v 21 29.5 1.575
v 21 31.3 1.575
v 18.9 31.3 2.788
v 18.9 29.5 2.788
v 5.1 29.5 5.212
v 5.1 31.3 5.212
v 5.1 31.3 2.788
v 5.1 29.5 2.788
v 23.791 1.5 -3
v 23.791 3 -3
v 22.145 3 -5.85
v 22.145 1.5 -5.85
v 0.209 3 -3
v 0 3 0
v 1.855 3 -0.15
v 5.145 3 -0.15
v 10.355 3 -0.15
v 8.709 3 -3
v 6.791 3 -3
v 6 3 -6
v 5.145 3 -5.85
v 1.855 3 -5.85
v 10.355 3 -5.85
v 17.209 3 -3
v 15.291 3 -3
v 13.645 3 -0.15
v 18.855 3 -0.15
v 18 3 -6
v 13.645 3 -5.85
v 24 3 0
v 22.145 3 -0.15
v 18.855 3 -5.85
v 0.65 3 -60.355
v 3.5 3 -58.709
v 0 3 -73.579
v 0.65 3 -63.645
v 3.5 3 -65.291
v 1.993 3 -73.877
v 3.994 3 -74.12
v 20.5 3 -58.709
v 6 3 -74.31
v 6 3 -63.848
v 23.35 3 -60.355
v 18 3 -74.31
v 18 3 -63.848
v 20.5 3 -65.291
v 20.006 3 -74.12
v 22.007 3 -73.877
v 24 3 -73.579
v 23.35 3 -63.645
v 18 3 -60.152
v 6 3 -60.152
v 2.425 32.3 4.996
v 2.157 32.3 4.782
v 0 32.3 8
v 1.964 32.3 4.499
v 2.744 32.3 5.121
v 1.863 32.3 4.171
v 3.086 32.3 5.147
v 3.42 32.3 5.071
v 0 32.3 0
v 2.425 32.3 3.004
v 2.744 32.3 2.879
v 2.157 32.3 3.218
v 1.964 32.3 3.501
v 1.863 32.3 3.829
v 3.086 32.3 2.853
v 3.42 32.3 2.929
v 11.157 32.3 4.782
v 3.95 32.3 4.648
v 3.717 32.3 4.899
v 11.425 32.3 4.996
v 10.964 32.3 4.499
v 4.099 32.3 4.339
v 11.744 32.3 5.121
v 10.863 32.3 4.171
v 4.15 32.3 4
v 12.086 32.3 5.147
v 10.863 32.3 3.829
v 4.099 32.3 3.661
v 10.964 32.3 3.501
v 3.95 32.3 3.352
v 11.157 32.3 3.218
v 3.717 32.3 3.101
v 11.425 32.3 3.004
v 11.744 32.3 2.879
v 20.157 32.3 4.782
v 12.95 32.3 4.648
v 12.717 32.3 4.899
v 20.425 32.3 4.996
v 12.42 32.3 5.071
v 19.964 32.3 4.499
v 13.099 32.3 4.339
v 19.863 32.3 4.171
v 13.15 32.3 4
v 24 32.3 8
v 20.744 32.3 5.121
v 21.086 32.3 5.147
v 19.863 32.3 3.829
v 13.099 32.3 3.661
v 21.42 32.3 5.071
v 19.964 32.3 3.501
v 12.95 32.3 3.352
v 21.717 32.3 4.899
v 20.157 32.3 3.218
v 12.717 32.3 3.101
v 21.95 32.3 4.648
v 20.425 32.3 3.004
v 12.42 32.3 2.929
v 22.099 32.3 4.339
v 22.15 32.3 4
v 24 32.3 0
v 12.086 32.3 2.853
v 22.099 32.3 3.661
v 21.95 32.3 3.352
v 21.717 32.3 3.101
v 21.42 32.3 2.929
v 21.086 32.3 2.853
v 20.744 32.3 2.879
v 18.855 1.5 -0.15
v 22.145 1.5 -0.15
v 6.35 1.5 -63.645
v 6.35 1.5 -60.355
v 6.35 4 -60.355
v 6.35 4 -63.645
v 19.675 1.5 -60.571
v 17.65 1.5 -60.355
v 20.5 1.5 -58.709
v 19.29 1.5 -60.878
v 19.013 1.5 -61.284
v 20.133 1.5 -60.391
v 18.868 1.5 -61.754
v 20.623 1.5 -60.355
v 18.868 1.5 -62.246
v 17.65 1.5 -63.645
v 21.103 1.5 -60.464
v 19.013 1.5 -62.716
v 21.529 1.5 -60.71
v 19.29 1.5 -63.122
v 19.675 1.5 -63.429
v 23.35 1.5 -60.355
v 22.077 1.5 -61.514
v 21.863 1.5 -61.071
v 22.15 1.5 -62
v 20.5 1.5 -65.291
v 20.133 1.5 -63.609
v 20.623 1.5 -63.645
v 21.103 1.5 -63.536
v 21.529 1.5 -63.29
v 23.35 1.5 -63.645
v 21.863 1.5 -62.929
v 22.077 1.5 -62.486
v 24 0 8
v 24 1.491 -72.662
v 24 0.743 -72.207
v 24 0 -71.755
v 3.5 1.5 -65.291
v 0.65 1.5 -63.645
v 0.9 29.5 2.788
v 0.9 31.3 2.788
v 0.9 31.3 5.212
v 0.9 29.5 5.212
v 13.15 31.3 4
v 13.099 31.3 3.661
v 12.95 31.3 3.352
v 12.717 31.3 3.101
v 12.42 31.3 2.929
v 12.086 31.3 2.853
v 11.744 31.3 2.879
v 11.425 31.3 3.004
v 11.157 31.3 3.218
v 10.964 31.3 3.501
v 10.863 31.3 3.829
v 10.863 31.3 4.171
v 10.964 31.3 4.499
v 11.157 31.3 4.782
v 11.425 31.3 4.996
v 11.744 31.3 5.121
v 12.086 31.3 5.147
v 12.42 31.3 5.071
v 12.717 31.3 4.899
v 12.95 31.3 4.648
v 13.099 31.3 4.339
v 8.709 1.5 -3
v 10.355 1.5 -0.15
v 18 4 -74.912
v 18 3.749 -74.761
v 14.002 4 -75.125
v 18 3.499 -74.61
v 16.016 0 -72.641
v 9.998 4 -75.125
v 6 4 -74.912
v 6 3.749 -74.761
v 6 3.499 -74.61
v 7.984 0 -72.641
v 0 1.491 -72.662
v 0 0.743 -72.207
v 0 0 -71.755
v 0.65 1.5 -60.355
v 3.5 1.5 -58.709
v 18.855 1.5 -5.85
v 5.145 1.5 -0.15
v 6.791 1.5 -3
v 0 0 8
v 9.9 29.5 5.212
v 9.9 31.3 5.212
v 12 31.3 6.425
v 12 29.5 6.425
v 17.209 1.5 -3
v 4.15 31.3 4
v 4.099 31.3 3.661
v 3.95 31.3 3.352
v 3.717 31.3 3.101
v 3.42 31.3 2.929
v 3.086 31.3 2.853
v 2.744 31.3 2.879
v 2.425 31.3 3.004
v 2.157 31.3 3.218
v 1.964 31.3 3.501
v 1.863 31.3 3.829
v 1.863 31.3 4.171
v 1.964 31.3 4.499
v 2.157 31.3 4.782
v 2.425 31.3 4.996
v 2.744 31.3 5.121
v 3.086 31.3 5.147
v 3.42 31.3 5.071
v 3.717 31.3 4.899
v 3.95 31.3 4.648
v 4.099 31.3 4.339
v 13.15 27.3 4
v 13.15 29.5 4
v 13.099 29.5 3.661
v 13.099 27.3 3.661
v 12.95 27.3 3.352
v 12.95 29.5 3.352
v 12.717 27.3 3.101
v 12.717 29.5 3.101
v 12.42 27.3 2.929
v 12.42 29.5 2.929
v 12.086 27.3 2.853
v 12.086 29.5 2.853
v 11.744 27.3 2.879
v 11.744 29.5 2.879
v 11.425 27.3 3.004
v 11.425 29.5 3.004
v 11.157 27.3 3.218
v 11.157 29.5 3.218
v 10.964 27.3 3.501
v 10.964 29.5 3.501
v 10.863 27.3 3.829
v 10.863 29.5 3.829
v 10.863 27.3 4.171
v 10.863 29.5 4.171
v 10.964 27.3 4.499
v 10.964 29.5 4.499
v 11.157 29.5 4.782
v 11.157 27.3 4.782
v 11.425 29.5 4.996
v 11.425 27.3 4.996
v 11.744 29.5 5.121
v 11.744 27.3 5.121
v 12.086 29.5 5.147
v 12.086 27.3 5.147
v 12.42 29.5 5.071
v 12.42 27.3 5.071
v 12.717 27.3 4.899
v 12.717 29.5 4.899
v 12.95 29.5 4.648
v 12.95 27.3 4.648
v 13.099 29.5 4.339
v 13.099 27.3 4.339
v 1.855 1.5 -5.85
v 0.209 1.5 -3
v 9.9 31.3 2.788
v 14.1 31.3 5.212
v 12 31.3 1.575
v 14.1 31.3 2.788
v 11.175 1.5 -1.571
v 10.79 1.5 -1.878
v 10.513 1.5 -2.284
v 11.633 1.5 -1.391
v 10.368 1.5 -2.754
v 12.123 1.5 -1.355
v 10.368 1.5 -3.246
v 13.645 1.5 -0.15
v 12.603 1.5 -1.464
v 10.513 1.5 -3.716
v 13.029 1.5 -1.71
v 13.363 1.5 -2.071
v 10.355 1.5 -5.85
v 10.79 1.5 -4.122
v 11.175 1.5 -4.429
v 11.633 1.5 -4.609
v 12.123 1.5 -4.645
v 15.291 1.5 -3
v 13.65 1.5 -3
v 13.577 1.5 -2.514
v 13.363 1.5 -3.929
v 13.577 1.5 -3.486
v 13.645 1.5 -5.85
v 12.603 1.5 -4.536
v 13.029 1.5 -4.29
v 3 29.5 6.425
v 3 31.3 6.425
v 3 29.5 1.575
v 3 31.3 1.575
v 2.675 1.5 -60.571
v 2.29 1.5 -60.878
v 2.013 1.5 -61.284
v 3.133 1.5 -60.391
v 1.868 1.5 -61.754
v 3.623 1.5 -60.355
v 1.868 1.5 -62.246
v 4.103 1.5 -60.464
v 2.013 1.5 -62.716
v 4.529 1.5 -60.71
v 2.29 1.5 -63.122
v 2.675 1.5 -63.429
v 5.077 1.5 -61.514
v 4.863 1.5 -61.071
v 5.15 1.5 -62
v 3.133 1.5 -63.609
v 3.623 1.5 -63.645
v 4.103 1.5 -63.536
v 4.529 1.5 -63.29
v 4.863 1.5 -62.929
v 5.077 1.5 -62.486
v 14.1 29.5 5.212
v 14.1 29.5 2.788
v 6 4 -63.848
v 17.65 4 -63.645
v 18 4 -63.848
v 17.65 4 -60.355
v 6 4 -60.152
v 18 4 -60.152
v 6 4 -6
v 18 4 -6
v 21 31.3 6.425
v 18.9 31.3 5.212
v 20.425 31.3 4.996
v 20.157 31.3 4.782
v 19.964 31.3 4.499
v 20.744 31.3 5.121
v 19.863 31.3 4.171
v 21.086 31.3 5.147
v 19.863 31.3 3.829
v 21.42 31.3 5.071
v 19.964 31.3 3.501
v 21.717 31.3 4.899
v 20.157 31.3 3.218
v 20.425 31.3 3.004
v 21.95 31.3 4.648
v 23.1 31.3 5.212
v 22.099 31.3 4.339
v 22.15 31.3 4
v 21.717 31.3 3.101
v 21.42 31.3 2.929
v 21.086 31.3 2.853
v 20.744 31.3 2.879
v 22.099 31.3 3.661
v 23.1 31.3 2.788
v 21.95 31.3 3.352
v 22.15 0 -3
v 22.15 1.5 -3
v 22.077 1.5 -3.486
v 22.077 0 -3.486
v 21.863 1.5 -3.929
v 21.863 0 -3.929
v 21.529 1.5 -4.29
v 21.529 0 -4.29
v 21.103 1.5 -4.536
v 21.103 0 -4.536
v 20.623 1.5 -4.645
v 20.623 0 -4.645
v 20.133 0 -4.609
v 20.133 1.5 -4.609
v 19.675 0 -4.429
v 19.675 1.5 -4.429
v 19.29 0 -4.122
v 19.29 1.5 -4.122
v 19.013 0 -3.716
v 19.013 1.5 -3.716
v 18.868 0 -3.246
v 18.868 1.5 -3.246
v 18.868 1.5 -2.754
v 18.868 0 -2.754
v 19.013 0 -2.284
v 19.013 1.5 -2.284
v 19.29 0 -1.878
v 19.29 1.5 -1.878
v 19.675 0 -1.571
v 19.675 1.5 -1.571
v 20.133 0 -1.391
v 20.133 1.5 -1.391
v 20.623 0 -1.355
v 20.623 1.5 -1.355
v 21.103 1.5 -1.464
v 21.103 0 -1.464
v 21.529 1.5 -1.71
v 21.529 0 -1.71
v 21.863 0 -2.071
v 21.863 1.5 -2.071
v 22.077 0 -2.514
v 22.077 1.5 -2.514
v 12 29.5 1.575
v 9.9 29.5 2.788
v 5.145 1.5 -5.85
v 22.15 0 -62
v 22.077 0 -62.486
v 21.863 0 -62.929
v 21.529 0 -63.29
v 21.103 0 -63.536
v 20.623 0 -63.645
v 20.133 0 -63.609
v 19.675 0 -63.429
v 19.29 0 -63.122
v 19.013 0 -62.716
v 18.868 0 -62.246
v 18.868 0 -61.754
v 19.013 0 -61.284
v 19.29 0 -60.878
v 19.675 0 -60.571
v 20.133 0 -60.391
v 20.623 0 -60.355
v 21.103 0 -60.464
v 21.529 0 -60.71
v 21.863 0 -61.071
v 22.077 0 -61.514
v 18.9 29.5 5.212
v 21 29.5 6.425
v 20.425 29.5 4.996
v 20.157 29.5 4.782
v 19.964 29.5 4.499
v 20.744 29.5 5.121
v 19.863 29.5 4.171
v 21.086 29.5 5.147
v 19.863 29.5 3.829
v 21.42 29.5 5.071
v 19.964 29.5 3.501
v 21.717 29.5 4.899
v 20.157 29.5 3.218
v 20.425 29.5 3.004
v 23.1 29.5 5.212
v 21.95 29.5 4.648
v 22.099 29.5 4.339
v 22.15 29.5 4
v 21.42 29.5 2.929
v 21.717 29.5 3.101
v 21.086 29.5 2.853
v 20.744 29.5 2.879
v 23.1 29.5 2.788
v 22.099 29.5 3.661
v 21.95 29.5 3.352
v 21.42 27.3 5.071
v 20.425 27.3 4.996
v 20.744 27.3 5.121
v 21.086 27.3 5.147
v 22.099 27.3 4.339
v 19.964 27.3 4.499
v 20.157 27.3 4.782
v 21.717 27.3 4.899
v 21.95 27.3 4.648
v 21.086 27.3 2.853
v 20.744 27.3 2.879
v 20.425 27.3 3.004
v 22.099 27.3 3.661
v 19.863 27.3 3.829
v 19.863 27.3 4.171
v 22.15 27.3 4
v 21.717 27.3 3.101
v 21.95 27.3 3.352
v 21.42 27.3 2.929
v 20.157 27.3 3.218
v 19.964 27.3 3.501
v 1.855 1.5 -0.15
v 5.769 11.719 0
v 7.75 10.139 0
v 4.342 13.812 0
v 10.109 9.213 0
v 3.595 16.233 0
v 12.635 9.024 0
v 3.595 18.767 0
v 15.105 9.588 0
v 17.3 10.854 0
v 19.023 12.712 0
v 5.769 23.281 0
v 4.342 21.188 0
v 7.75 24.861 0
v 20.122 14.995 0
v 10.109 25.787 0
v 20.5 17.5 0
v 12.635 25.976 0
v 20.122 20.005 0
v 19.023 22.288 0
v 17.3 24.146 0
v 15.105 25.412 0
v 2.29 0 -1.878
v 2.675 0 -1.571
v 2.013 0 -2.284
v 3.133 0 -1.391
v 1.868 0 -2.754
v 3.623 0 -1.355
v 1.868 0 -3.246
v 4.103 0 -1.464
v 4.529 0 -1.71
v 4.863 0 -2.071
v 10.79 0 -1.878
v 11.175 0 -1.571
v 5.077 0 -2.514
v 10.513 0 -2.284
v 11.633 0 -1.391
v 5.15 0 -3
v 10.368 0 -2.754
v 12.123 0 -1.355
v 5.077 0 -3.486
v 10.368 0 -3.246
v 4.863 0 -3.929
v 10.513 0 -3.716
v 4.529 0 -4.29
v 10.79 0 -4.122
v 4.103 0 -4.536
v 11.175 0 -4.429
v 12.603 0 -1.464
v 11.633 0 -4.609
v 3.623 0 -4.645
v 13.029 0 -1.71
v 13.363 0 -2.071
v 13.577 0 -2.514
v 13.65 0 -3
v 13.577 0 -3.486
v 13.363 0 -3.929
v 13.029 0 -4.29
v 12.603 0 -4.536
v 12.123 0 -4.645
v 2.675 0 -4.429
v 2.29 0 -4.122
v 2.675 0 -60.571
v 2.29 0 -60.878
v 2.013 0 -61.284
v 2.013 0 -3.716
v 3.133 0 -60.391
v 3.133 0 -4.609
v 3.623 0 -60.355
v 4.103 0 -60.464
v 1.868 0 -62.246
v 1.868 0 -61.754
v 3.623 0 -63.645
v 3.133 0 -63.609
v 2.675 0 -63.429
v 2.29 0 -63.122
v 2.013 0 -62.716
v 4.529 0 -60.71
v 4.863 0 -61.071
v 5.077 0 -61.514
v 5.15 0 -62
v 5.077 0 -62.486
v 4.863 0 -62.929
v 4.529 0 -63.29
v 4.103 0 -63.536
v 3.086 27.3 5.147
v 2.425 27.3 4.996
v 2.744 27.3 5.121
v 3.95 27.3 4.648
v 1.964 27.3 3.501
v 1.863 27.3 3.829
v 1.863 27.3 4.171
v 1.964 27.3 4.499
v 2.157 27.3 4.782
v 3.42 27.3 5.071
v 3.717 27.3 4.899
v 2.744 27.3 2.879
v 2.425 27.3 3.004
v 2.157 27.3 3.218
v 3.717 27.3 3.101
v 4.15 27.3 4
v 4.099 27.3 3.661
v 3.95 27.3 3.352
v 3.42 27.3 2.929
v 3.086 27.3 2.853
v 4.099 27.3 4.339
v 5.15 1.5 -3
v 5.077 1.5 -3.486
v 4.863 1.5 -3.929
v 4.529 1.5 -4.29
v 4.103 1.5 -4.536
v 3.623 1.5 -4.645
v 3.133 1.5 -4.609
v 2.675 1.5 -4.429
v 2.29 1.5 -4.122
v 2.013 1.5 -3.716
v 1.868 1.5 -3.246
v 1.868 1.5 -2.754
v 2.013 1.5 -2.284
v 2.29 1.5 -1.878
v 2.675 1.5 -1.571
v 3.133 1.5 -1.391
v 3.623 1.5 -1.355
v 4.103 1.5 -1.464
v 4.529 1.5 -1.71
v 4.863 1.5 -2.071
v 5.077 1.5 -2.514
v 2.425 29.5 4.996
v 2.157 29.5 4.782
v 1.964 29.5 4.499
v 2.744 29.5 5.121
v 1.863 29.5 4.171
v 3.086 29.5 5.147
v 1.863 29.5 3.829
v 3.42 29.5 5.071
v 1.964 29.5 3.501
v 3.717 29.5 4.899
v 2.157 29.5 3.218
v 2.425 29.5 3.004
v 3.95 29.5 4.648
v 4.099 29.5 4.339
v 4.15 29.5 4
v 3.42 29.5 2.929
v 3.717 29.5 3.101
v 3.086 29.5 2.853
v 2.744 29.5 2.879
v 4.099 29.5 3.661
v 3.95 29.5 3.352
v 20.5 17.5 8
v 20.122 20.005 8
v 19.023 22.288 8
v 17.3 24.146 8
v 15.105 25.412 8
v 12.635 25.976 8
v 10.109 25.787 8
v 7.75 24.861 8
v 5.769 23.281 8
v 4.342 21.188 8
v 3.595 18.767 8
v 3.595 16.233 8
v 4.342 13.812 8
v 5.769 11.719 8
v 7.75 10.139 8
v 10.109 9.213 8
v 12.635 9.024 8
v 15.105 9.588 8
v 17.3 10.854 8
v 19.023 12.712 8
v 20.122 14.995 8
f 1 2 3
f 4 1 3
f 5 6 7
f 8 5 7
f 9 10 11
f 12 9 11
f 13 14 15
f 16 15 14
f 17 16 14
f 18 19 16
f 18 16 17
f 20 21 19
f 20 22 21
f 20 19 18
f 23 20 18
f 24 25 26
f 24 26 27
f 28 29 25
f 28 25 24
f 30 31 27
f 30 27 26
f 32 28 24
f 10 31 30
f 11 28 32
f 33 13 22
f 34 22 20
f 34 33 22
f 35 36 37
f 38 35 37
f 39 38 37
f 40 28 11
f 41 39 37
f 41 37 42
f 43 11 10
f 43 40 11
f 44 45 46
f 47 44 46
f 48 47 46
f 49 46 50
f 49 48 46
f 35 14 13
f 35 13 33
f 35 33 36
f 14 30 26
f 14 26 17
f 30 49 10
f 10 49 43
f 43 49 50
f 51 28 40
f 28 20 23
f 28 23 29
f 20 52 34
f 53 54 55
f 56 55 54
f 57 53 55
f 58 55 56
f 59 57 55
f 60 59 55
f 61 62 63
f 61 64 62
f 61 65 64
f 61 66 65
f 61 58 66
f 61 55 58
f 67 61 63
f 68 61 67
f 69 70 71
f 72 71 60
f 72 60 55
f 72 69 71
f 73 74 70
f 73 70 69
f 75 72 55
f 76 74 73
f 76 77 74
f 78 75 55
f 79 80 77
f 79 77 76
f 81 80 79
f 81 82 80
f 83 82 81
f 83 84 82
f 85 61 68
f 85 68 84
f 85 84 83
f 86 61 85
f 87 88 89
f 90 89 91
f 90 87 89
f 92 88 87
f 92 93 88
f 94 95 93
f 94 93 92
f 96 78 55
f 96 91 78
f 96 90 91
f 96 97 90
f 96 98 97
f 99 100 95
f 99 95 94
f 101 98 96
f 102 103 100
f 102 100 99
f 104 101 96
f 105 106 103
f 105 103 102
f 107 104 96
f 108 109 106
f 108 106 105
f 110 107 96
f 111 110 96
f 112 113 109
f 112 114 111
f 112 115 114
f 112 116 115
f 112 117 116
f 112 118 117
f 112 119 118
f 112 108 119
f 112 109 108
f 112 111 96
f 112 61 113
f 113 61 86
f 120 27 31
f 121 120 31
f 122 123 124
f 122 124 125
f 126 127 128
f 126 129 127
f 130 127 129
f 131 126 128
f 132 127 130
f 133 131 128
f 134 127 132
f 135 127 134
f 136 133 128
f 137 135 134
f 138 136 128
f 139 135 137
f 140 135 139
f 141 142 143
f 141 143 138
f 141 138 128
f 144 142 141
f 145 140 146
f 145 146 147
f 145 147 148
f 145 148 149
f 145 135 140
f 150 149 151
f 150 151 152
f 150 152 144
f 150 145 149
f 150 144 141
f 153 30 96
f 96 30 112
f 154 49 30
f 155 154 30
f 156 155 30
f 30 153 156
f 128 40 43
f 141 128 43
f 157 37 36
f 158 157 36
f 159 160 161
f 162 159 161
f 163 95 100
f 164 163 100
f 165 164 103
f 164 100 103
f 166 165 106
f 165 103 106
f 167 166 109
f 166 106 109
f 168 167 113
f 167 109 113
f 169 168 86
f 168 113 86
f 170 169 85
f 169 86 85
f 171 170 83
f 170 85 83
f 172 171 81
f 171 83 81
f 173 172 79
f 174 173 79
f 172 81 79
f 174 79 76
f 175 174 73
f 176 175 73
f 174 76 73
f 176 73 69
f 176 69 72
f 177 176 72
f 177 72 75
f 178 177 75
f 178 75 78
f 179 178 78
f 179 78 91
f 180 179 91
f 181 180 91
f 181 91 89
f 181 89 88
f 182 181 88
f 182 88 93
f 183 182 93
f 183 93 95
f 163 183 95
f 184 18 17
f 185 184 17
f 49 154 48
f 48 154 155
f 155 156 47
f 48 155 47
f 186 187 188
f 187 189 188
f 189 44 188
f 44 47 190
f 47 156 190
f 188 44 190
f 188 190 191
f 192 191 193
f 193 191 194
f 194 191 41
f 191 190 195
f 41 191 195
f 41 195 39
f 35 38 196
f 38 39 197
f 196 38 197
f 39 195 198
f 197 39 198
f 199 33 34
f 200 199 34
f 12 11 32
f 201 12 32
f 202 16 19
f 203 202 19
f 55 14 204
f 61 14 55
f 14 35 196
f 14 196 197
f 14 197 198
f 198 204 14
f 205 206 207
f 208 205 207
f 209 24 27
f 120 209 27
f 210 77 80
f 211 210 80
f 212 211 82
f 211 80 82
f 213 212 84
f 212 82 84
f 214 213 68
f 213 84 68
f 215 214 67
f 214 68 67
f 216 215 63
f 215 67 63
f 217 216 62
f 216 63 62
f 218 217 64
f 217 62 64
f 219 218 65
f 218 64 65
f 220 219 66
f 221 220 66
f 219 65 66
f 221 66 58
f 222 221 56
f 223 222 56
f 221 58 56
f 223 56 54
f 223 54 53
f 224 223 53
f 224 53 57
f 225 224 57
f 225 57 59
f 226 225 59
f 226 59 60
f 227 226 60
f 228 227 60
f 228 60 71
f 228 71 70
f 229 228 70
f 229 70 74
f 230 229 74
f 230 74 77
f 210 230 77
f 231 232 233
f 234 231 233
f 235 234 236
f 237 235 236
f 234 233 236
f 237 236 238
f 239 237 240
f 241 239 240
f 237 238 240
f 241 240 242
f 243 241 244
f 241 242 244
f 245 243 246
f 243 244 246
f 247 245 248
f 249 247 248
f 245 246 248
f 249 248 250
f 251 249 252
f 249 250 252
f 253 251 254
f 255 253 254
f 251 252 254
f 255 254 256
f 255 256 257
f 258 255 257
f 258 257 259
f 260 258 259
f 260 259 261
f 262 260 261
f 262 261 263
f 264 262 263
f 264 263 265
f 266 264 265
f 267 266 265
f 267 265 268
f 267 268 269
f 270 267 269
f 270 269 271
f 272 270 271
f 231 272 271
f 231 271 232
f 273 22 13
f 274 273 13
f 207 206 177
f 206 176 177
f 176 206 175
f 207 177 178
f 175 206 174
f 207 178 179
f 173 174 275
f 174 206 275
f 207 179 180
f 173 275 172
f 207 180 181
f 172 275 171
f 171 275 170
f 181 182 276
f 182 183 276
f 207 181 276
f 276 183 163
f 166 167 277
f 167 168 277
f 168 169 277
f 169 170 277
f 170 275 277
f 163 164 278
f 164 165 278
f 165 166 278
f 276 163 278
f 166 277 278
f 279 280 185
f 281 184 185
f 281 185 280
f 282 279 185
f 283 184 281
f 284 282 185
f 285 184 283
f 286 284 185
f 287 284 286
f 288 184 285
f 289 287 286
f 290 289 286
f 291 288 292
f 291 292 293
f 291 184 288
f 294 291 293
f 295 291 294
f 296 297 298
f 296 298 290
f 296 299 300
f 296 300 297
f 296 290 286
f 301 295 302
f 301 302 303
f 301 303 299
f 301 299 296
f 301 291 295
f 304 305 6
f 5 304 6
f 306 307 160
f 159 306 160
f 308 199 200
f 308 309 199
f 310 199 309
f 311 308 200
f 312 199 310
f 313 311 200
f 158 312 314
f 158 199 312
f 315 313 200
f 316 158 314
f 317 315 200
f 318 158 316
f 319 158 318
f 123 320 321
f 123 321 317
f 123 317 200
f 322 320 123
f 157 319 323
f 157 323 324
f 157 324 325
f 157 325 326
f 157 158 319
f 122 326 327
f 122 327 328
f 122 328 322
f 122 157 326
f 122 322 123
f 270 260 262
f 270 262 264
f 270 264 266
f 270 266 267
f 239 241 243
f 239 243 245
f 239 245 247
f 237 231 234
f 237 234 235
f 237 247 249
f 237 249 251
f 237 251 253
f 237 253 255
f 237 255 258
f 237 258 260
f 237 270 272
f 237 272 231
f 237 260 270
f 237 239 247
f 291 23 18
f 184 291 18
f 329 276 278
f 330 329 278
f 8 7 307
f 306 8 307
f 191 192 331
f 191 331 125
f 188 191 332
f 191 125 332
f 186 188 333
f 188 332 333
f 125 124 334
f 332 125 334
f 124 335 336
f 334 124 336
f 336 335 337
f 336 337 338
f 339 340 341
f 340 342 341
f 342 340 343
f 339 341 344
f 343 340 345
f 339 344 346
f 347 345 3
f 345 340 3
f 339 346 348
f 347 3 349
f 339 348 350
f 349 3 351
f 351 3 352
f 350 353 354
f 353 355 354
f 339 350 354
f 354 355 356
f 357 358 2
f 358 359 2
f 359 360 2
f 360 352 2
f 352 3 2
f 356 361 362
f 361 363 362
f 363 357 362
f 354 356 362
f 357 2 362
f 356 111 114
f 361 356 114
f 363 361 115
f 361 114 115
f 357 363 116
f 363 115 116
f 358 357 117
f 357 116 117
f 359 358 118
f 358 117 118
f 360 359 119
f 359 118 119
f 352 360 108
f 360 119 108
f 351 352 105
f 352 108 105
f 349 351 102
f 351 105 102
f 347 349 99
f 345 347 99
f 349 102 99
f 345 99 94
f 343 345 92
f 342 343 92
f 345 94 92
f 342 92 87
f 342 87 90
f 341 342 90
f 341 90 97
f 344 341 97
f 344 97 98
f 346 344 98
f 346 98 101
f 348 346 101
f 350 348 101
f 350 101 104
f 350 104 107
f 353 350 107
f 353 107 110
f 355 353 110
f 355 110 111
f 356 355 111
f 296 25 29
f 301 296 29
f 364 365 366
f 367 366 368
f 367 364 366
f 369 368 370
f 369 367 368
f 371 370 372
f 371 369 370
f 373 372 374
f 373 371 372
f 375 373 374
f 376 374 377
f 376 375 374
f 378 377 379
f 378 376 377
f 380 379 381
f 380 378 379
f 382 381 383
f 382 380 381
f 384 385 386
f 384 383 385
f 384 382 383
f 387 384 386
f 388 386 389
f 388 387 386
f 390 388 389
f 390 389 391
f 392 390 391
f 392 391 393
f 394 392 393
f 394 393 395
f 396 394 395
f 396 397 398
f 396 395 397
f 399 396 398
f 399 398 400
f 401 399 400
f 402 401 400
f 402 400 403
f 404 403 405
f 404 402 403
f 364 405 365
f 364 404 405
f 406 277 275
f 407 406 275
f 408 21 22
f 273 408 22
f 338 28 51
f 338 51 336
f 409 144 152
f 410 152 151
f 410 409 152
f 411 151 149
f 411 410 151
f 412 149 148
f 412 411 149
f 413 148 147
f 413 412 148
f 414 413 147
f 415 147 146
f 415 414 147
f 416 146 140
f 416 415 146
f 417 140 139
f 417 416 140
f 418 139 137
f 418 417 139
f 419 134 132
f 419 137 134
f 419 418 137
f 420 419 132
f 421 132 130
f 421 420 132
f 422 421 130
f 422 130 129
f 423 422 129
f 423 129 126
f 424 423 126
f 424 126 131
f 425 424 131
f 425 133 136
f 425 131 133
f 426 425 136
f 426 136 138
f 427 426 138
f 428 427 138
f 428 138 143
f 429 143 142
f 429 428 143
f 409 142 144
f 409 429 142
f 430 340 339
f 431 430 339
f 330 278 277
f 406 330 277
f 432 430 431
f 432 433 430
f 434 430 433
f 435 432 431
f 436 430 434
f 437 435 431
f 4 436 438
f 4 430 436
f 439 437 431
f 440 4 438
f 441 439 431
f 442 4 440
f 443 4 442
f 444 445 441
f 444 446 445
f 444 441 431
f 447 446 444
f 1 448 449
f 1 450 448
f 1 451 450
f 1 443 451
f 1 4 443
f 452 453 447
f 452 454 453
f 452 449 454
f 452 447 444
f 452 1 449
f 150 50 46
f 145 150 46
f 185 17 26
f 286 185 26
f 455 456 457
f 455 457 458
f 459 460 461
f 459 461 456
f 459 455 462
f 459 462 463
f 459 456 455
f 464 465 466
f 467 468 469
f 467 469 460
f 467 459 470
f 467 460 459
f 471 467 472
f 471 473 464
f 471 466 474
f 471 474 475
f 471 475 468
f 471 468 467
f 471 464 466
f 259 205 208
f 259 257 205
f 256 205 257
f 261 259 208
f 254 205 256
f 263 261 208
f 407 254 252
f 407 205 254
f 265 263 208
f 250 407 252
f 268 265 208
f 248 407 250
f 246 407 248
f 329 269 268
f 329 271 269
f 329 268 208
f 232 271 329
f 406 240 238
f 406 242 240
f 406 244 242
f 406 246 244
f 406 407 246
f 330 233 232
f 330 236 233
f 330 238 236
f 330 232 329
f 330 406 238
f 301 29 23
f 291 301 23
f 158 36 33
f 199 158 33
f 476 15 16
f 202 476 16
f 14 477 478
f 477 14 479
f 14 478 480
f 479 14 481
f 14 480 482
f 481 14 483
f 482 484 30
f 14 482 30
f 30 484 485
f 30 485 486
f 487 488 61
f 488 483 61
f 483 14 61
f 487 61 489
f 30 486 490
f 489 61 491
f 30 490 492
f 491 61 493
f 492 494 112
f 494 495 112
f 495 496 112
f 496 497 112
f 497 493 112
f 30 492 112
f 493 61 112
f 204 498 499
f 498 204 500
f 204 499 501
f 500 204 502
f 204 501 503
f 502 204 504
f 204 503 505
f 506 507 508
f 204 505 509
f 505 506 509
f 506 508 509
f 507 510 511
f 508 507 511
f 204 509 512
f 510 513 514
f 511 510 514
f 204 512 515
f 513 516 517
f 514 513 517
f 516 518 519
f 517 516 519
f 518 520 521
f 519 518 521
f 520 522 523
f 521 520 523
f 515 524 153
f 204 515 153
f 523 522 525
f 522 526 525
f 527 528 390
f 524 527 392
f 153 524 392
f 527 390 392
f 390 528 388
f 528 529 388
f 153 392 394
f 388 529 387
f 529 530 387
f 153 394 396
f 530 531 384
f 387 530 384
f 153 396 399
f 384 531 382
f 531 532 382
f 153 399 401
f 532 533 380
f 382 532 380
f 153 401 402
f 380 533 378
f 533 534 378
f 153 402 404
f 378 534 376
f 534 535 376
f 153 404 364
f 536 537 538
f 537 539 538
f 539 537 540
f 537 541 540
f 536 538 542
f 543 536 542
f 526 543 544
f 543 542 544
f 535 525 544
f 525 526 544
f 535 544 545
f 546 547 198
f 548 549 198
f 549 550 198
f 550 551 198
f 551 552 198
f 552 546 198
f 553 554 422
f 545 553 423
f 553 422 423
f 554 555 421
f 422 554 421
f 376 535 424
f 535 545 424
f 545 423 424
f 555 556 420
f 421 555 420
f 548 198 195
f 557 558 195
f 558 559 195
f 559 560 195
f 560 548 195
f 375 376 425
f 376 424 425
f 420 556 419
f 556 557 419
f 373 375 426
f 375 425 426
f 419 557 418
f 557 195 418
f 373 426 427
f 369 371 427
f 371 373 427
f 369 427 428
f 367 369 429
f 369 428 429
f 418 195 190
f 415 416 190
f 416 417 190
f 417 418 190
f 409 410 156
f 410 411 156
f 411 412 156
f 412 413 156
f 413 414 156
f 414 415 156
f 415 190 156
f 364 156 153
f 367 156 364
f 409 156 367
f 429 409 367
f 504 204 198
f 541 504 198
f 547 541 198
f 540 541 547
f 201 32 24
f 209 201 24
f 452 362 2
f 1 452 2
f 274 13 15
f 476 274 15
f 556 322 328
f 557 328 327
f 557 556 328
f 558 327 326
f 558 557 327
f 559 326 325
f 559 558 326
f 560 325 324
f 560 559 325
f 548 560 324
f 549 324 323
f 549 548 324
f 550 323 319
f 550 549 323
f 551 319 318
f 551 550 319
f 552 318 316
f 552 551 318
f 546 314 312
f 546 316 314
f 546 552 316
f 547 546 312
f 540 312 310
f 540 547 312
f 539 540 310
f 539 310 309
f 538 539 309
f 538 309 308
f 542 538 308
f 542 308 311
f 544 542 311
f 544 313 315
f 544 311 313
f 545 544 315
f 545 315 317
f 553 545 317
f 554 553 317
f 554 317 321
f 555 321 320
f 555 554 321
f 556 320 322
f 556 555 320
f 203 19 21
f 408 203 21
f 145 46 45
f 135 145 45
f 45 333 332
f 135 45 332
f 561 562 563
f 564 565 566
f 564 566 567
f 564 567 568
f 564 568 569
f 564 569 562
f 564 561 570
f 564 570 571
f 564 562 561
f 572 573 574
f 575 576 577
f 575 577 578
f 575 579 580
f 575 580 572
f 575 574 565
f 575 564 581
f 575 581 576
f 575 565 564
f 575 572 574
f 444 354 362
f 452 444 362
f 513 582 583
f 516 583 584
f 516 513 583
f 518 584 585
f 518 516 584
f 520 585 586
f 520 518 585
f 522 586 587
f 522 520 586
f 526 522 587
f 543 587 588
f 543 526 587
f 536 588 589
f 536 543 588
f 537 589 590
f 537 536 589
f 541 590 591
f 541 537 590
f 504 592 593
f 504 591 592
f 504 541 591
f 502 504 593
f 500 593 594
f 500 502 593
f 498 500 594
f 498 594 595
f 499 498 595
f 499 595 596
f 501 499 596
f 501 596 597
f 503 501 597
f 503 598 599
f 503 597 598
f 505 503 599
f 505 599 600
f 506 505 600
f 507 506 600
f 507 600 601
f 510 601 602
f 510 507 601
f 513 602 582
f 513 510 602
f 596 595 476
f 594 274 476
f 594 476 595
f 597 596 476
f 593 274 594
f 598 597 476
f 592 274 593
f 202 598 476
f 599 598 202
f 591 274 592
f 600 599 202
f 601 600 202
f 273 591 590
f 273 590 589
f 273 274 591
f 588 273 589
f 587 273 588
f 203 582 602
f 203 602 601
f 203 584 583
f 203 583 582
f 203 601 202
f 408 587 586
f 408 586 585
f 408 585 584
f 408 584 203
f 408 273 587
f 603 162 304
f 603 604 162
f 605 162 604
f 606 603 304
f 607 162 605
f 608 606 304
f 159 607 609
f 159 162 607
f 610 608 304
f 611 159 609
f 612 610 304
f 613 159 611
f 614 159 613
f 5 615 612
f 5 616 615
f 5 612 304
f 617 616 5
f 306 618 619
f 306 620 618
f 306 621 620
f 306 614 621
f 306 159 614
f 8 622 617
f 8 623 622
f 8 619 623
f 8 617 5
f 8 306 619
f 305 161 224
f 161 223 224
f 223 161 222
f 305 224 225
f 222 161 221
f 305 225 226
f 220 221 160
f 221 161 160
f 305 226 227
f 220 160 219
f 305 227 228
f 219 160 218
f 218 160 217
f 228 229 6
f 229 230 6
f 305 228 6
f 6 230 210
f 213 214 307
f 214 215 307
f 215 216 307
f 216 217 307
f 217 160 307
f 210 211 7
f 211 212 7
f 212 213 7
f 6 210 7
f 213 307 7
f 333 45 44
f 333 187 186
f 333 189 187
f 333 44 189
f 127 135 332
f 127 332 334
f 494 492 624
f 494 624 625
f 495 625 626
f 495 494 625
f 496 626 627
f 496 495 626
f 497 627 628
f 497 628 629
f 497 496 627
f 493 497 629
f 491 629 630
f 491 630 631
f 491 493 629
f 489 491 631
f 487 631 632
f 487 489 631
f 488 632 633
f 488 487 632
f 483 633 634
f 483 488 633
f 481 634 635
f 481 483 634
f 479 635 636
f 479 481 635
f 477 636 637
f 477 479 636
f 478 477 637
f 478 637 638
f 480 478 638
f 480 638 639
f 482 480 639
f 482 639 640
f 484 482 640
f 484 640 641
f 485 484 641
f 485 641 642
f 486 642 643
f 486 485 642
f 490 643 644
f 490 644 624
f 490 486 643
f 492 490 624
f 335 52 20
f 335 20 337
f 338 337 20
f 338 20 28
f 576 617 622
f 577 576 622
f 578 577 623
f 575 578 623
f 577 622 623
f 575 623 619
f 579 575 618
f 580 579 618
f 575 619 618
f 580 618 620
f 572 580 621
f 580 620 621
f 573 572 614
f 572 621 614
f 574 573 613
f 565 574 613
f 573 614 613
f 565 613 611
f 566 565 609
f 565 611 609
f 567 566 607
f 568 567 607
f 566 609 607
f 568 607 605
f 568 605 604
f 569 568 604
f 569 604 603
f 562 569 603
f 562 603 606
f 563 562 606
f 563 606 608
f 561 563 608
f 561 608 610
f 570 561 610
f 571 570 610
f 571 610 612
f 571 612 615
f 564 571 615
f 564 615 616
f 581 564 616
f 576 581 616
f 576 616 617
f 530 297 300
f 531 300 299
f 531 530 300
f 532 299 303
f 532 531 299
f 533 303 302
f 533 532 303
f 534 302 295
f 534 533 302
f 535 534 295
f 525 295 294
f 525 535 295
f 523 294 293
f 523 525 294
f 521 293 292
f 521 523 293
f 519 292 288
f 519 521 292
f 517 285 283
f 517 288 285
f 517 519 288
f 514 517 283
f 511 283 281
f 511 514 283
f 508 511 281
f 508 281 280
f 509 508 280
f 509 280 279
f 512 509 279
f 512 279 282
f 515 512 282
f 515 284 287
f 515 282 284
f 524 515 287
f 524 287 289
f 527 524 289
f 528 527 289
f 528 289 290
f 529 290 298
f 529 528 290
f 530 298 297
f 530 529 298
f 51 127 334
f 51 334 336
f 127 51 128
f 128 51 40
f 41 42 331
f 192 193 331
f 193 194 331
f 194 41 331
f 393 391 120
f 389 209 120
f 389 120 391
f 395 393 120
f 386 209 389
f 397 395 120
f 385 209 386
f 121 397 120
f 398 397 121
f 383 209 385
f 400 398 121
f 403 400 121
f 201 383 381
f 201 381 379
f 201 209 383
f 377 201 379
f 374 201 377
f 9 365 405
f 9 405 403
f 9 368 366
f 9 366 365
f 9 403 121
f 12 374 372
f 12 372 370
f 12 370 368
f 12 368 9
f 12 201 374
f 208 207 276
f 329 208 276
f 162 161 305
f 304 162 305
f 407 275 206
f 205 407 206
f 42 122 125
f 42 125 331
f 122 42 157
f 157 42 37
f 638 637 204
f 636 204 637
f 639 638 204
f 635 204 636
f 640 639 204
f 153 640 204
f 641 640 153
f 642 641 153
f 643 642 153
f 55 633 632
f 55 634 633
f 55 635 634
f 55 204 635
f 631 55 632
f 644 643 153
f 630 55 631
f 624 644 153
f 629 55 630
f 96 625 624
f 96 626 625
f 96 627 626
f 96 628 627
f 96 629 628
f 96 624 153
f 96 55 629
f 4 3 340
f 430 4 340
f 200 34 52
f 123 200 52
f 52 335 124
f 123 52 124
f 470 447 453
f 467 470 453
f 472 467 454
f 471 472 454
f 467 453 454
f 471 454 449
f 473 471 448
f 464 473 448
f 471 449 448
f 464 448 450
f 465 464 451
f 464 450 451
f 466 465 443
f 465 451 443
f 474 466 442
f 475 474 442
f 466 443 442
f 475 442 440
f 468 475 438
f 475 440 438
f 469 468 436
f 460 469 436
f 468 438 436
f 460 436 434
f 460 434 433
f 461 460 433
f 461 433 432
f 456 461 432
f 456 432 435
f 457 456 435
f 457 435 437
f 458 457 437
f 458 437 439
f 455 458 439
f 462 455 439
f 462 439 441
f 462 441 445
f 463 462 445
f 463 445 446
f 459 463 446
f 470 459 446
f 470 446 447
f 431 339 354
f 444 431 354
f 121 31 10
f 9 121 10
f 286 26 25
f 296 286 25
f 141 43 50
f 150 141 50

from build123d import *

# Parameters (mm, degrees)
SKETCH1_W               = 24
SKETCH1_H               = 81.502166862
BOSS_EXTRUDE1_DEPTH     = 3
SKETCH2_R               = 1.65
CUT_EXTRUDE1_DEPTH      = 4
BOSS_EXTRUDE2_START     = -6
SKETCH3_W               = 12
SKETCH3_H               = 1
BOSS_EXTRUDE2_DEPTH     = 75.502167
CUT_EXTRUDE2_DEPTH      = 2
CUT_EXTRUDE2_DEPTH_BACK = 1.5
SKETCH6_W               = 24
SKETCH6_H               = 32.3
SKETCH6_R               = 8.5
BOSS_EXTRUDE3_DEPTH     = 8
SKETCH9_R               = 1.15
CUT_EXTRUDE3_DEPTH      = 5
CUT_EXTRUDE4_START      = -1
CUT_EXTRUDE4_DEPTH      = 1.8


with BuildPart() as part:
    # Sketch1 → Boss-Extrude1 (new body)
    with BuildSketch(Plane(origin=(0, 0, 0), x_dir=(1, 0, 0), z_dir=(0, 1, 0))):
        with Locations((12, 40.751083431)):
            Rectangle(SKETCH1_W, SKETCH1_H)
    extrude(amount=BOSS_EXTRUDE1_DEPTH)

    # Sketch2 → Cut-Extrude1 (cut, through all)
    with BuildSketch(Plane(origin=(0, 0, 0), x_dir=(1, 0, 0), z_dir=(0, 1, 0))):
        with Locations((3.5, 3)):
            Circle(SKETCH2_R)
        with Locations((12, 3)):
            Circle(SKETCH2_R)
        with Locations((20.5, 3)):
            Circle(SKETCH2_R)
        with Locations((3.5, 62)):
            Circle(SKETCH2_R)
        with Locations((20.5, 62)):
            Circle(SKETCH2_R)
    extrude(amount=CUT_EXTRUDE1_DEPTH, mode=Mode.SUBTRACT)

    # Sketch3 → Boss-Extrude2 (add)
    with BuildSketch(Plane.XY.offset(BOSS_EXTRUDE2_START)):
        with Locations((12, 3.5)):
            Rectangle(SKETCH3_W, SKETCH3_H)
    extrude(amount=-BOSS_EXTRUDE2_DEPTH)

    # Sketch4 → Cut-Revolve1 (revolve, cut)
    with BuildSketch(Plane(origin=(12, 0, 0), x_dir=(0, 0, -1), z_dir=(1, 0, 0))):
        Polygon((94.496458379, 36.241477716), (19.413701779, -88.89644995), (139.590265278, -88.89644995), (139.590265278, 36.241477716), align=None)
    revolve(axis=Axis((12, 0, 0), (0, 1, 0)), mode=Mode.SUBTRACT)

    # Sketch5 → Cut-Extrude2 (cut, two sides)
    with BuildSketch(Plane(origin=(0, 3, 0), x_dir=(1, 0, 0), z_dir=(0, 1, 0))) as cut_extrude2_sk:
        Polygon((15.290896534, 3), (13.645448267, 5.85), (10.354551733, 5.85), (8.709103466, 3), (10.354551733, 0.15), (13.645448267, 0.15), align=None)
        Polygon((23.790896534, 3), (22.145448267, 5.85), (18.854551733, 5.85), (17.209103466, 3), (18.854551733, 0.15), (22.145448267, 0.15), align=None)
        Polygon((6.790896534, 3), (5.145448267, 5.85), (1.854551733, 5.85), (0.209103466, 3), (1.854551733, 0.15), (5.145448267, 0.15), align=None)
        Polygon((6.35, 63.645448267), (3.5, 65.290896534), (0.65, 63.645448267), (0.65, 60.354551733), (3.5, 58.709103466), (6.35, 60.354551733), align=None)
        Polygon((23.35, 63.645448267), (20.5, 65.290896534), (17.65, 63.645448267), (17.65, 60.354551733), (20.5, 58.709103466), (23.35, 60.354551733), align=None)
    extrude(amount=CUT_EXTRUDE2_DEPTH, mode=Mode.SUBTRACT)
    extrude(cut_extrude2_sk.sketch, amount=-CUT_EXTRUDE2_DEPTH_BACK, mode=Mode.SUBTRACT)

    # Sketch6 → Boss-Extrude3 (add)
    with BuildSketch(Plane.XY):
        with Locations((12, 16.15)):
            Rectangle(SKETCH6_W, SKETCH6_H)
        with Locations((12, 17.5)):
            Circle(SKETCH6_R, mode=Mode.SUBTRACT)
    extrude(amount=BOSS_EXTRUDE3_DEPTH)

    # Sketch9 → Cut-Extrude3 (cut)
    with BuildSketch(Plane(origin=(0, 32.3, 0), x_dir=(1, 0, 0), z_dir=(0, 1, 0))):
        with Locations((3, -4)):
            Circle(SKETCH9_R)
        with Locations((12, -4)):
            Circle(SKETCH9_R)
        with Locations((21, -4)):
            Circle(SKETCH9_R)
    extrude(amount=-CUT_EXTRUDE3_DEPTH, mode=Mode.SUBTRACT)

    # Sketch10 → Cut-Extrude4 (cut)
    with BuildSketch(Plane(origin=(0, 32.3, 0), x_dir=(1, 0, 0), z_dir=(0, 1, 0)).offset(CUT_EXTRUDE4_START)):
        Polygon((3, -6.424871131), (5.1, -5.212435565), (5.1, -2.787564435), (3, -1.575128869), (0.9, -2.787564435), (0.9, -5.212435565), align=None)
        Polygon((12, -6.424871131), (14.1, -5.212435565), (14.1, -2.787564435), (12, -1.575128869), (9.9, -2.787564435), (9.9, -5.212435565), align=None)
        Polygon((21, -6.424871131), (23.1, -5.212435565), (23.1, -2.787564435), (21, -1.575128869), (18.9, -2.787564435), (18.9, -5.212435565), align=None)
    extrude(amount=-CUT_EXTRUDE4_DEPTH, mode=Mode.SUBTRACT)


solid = part.part
